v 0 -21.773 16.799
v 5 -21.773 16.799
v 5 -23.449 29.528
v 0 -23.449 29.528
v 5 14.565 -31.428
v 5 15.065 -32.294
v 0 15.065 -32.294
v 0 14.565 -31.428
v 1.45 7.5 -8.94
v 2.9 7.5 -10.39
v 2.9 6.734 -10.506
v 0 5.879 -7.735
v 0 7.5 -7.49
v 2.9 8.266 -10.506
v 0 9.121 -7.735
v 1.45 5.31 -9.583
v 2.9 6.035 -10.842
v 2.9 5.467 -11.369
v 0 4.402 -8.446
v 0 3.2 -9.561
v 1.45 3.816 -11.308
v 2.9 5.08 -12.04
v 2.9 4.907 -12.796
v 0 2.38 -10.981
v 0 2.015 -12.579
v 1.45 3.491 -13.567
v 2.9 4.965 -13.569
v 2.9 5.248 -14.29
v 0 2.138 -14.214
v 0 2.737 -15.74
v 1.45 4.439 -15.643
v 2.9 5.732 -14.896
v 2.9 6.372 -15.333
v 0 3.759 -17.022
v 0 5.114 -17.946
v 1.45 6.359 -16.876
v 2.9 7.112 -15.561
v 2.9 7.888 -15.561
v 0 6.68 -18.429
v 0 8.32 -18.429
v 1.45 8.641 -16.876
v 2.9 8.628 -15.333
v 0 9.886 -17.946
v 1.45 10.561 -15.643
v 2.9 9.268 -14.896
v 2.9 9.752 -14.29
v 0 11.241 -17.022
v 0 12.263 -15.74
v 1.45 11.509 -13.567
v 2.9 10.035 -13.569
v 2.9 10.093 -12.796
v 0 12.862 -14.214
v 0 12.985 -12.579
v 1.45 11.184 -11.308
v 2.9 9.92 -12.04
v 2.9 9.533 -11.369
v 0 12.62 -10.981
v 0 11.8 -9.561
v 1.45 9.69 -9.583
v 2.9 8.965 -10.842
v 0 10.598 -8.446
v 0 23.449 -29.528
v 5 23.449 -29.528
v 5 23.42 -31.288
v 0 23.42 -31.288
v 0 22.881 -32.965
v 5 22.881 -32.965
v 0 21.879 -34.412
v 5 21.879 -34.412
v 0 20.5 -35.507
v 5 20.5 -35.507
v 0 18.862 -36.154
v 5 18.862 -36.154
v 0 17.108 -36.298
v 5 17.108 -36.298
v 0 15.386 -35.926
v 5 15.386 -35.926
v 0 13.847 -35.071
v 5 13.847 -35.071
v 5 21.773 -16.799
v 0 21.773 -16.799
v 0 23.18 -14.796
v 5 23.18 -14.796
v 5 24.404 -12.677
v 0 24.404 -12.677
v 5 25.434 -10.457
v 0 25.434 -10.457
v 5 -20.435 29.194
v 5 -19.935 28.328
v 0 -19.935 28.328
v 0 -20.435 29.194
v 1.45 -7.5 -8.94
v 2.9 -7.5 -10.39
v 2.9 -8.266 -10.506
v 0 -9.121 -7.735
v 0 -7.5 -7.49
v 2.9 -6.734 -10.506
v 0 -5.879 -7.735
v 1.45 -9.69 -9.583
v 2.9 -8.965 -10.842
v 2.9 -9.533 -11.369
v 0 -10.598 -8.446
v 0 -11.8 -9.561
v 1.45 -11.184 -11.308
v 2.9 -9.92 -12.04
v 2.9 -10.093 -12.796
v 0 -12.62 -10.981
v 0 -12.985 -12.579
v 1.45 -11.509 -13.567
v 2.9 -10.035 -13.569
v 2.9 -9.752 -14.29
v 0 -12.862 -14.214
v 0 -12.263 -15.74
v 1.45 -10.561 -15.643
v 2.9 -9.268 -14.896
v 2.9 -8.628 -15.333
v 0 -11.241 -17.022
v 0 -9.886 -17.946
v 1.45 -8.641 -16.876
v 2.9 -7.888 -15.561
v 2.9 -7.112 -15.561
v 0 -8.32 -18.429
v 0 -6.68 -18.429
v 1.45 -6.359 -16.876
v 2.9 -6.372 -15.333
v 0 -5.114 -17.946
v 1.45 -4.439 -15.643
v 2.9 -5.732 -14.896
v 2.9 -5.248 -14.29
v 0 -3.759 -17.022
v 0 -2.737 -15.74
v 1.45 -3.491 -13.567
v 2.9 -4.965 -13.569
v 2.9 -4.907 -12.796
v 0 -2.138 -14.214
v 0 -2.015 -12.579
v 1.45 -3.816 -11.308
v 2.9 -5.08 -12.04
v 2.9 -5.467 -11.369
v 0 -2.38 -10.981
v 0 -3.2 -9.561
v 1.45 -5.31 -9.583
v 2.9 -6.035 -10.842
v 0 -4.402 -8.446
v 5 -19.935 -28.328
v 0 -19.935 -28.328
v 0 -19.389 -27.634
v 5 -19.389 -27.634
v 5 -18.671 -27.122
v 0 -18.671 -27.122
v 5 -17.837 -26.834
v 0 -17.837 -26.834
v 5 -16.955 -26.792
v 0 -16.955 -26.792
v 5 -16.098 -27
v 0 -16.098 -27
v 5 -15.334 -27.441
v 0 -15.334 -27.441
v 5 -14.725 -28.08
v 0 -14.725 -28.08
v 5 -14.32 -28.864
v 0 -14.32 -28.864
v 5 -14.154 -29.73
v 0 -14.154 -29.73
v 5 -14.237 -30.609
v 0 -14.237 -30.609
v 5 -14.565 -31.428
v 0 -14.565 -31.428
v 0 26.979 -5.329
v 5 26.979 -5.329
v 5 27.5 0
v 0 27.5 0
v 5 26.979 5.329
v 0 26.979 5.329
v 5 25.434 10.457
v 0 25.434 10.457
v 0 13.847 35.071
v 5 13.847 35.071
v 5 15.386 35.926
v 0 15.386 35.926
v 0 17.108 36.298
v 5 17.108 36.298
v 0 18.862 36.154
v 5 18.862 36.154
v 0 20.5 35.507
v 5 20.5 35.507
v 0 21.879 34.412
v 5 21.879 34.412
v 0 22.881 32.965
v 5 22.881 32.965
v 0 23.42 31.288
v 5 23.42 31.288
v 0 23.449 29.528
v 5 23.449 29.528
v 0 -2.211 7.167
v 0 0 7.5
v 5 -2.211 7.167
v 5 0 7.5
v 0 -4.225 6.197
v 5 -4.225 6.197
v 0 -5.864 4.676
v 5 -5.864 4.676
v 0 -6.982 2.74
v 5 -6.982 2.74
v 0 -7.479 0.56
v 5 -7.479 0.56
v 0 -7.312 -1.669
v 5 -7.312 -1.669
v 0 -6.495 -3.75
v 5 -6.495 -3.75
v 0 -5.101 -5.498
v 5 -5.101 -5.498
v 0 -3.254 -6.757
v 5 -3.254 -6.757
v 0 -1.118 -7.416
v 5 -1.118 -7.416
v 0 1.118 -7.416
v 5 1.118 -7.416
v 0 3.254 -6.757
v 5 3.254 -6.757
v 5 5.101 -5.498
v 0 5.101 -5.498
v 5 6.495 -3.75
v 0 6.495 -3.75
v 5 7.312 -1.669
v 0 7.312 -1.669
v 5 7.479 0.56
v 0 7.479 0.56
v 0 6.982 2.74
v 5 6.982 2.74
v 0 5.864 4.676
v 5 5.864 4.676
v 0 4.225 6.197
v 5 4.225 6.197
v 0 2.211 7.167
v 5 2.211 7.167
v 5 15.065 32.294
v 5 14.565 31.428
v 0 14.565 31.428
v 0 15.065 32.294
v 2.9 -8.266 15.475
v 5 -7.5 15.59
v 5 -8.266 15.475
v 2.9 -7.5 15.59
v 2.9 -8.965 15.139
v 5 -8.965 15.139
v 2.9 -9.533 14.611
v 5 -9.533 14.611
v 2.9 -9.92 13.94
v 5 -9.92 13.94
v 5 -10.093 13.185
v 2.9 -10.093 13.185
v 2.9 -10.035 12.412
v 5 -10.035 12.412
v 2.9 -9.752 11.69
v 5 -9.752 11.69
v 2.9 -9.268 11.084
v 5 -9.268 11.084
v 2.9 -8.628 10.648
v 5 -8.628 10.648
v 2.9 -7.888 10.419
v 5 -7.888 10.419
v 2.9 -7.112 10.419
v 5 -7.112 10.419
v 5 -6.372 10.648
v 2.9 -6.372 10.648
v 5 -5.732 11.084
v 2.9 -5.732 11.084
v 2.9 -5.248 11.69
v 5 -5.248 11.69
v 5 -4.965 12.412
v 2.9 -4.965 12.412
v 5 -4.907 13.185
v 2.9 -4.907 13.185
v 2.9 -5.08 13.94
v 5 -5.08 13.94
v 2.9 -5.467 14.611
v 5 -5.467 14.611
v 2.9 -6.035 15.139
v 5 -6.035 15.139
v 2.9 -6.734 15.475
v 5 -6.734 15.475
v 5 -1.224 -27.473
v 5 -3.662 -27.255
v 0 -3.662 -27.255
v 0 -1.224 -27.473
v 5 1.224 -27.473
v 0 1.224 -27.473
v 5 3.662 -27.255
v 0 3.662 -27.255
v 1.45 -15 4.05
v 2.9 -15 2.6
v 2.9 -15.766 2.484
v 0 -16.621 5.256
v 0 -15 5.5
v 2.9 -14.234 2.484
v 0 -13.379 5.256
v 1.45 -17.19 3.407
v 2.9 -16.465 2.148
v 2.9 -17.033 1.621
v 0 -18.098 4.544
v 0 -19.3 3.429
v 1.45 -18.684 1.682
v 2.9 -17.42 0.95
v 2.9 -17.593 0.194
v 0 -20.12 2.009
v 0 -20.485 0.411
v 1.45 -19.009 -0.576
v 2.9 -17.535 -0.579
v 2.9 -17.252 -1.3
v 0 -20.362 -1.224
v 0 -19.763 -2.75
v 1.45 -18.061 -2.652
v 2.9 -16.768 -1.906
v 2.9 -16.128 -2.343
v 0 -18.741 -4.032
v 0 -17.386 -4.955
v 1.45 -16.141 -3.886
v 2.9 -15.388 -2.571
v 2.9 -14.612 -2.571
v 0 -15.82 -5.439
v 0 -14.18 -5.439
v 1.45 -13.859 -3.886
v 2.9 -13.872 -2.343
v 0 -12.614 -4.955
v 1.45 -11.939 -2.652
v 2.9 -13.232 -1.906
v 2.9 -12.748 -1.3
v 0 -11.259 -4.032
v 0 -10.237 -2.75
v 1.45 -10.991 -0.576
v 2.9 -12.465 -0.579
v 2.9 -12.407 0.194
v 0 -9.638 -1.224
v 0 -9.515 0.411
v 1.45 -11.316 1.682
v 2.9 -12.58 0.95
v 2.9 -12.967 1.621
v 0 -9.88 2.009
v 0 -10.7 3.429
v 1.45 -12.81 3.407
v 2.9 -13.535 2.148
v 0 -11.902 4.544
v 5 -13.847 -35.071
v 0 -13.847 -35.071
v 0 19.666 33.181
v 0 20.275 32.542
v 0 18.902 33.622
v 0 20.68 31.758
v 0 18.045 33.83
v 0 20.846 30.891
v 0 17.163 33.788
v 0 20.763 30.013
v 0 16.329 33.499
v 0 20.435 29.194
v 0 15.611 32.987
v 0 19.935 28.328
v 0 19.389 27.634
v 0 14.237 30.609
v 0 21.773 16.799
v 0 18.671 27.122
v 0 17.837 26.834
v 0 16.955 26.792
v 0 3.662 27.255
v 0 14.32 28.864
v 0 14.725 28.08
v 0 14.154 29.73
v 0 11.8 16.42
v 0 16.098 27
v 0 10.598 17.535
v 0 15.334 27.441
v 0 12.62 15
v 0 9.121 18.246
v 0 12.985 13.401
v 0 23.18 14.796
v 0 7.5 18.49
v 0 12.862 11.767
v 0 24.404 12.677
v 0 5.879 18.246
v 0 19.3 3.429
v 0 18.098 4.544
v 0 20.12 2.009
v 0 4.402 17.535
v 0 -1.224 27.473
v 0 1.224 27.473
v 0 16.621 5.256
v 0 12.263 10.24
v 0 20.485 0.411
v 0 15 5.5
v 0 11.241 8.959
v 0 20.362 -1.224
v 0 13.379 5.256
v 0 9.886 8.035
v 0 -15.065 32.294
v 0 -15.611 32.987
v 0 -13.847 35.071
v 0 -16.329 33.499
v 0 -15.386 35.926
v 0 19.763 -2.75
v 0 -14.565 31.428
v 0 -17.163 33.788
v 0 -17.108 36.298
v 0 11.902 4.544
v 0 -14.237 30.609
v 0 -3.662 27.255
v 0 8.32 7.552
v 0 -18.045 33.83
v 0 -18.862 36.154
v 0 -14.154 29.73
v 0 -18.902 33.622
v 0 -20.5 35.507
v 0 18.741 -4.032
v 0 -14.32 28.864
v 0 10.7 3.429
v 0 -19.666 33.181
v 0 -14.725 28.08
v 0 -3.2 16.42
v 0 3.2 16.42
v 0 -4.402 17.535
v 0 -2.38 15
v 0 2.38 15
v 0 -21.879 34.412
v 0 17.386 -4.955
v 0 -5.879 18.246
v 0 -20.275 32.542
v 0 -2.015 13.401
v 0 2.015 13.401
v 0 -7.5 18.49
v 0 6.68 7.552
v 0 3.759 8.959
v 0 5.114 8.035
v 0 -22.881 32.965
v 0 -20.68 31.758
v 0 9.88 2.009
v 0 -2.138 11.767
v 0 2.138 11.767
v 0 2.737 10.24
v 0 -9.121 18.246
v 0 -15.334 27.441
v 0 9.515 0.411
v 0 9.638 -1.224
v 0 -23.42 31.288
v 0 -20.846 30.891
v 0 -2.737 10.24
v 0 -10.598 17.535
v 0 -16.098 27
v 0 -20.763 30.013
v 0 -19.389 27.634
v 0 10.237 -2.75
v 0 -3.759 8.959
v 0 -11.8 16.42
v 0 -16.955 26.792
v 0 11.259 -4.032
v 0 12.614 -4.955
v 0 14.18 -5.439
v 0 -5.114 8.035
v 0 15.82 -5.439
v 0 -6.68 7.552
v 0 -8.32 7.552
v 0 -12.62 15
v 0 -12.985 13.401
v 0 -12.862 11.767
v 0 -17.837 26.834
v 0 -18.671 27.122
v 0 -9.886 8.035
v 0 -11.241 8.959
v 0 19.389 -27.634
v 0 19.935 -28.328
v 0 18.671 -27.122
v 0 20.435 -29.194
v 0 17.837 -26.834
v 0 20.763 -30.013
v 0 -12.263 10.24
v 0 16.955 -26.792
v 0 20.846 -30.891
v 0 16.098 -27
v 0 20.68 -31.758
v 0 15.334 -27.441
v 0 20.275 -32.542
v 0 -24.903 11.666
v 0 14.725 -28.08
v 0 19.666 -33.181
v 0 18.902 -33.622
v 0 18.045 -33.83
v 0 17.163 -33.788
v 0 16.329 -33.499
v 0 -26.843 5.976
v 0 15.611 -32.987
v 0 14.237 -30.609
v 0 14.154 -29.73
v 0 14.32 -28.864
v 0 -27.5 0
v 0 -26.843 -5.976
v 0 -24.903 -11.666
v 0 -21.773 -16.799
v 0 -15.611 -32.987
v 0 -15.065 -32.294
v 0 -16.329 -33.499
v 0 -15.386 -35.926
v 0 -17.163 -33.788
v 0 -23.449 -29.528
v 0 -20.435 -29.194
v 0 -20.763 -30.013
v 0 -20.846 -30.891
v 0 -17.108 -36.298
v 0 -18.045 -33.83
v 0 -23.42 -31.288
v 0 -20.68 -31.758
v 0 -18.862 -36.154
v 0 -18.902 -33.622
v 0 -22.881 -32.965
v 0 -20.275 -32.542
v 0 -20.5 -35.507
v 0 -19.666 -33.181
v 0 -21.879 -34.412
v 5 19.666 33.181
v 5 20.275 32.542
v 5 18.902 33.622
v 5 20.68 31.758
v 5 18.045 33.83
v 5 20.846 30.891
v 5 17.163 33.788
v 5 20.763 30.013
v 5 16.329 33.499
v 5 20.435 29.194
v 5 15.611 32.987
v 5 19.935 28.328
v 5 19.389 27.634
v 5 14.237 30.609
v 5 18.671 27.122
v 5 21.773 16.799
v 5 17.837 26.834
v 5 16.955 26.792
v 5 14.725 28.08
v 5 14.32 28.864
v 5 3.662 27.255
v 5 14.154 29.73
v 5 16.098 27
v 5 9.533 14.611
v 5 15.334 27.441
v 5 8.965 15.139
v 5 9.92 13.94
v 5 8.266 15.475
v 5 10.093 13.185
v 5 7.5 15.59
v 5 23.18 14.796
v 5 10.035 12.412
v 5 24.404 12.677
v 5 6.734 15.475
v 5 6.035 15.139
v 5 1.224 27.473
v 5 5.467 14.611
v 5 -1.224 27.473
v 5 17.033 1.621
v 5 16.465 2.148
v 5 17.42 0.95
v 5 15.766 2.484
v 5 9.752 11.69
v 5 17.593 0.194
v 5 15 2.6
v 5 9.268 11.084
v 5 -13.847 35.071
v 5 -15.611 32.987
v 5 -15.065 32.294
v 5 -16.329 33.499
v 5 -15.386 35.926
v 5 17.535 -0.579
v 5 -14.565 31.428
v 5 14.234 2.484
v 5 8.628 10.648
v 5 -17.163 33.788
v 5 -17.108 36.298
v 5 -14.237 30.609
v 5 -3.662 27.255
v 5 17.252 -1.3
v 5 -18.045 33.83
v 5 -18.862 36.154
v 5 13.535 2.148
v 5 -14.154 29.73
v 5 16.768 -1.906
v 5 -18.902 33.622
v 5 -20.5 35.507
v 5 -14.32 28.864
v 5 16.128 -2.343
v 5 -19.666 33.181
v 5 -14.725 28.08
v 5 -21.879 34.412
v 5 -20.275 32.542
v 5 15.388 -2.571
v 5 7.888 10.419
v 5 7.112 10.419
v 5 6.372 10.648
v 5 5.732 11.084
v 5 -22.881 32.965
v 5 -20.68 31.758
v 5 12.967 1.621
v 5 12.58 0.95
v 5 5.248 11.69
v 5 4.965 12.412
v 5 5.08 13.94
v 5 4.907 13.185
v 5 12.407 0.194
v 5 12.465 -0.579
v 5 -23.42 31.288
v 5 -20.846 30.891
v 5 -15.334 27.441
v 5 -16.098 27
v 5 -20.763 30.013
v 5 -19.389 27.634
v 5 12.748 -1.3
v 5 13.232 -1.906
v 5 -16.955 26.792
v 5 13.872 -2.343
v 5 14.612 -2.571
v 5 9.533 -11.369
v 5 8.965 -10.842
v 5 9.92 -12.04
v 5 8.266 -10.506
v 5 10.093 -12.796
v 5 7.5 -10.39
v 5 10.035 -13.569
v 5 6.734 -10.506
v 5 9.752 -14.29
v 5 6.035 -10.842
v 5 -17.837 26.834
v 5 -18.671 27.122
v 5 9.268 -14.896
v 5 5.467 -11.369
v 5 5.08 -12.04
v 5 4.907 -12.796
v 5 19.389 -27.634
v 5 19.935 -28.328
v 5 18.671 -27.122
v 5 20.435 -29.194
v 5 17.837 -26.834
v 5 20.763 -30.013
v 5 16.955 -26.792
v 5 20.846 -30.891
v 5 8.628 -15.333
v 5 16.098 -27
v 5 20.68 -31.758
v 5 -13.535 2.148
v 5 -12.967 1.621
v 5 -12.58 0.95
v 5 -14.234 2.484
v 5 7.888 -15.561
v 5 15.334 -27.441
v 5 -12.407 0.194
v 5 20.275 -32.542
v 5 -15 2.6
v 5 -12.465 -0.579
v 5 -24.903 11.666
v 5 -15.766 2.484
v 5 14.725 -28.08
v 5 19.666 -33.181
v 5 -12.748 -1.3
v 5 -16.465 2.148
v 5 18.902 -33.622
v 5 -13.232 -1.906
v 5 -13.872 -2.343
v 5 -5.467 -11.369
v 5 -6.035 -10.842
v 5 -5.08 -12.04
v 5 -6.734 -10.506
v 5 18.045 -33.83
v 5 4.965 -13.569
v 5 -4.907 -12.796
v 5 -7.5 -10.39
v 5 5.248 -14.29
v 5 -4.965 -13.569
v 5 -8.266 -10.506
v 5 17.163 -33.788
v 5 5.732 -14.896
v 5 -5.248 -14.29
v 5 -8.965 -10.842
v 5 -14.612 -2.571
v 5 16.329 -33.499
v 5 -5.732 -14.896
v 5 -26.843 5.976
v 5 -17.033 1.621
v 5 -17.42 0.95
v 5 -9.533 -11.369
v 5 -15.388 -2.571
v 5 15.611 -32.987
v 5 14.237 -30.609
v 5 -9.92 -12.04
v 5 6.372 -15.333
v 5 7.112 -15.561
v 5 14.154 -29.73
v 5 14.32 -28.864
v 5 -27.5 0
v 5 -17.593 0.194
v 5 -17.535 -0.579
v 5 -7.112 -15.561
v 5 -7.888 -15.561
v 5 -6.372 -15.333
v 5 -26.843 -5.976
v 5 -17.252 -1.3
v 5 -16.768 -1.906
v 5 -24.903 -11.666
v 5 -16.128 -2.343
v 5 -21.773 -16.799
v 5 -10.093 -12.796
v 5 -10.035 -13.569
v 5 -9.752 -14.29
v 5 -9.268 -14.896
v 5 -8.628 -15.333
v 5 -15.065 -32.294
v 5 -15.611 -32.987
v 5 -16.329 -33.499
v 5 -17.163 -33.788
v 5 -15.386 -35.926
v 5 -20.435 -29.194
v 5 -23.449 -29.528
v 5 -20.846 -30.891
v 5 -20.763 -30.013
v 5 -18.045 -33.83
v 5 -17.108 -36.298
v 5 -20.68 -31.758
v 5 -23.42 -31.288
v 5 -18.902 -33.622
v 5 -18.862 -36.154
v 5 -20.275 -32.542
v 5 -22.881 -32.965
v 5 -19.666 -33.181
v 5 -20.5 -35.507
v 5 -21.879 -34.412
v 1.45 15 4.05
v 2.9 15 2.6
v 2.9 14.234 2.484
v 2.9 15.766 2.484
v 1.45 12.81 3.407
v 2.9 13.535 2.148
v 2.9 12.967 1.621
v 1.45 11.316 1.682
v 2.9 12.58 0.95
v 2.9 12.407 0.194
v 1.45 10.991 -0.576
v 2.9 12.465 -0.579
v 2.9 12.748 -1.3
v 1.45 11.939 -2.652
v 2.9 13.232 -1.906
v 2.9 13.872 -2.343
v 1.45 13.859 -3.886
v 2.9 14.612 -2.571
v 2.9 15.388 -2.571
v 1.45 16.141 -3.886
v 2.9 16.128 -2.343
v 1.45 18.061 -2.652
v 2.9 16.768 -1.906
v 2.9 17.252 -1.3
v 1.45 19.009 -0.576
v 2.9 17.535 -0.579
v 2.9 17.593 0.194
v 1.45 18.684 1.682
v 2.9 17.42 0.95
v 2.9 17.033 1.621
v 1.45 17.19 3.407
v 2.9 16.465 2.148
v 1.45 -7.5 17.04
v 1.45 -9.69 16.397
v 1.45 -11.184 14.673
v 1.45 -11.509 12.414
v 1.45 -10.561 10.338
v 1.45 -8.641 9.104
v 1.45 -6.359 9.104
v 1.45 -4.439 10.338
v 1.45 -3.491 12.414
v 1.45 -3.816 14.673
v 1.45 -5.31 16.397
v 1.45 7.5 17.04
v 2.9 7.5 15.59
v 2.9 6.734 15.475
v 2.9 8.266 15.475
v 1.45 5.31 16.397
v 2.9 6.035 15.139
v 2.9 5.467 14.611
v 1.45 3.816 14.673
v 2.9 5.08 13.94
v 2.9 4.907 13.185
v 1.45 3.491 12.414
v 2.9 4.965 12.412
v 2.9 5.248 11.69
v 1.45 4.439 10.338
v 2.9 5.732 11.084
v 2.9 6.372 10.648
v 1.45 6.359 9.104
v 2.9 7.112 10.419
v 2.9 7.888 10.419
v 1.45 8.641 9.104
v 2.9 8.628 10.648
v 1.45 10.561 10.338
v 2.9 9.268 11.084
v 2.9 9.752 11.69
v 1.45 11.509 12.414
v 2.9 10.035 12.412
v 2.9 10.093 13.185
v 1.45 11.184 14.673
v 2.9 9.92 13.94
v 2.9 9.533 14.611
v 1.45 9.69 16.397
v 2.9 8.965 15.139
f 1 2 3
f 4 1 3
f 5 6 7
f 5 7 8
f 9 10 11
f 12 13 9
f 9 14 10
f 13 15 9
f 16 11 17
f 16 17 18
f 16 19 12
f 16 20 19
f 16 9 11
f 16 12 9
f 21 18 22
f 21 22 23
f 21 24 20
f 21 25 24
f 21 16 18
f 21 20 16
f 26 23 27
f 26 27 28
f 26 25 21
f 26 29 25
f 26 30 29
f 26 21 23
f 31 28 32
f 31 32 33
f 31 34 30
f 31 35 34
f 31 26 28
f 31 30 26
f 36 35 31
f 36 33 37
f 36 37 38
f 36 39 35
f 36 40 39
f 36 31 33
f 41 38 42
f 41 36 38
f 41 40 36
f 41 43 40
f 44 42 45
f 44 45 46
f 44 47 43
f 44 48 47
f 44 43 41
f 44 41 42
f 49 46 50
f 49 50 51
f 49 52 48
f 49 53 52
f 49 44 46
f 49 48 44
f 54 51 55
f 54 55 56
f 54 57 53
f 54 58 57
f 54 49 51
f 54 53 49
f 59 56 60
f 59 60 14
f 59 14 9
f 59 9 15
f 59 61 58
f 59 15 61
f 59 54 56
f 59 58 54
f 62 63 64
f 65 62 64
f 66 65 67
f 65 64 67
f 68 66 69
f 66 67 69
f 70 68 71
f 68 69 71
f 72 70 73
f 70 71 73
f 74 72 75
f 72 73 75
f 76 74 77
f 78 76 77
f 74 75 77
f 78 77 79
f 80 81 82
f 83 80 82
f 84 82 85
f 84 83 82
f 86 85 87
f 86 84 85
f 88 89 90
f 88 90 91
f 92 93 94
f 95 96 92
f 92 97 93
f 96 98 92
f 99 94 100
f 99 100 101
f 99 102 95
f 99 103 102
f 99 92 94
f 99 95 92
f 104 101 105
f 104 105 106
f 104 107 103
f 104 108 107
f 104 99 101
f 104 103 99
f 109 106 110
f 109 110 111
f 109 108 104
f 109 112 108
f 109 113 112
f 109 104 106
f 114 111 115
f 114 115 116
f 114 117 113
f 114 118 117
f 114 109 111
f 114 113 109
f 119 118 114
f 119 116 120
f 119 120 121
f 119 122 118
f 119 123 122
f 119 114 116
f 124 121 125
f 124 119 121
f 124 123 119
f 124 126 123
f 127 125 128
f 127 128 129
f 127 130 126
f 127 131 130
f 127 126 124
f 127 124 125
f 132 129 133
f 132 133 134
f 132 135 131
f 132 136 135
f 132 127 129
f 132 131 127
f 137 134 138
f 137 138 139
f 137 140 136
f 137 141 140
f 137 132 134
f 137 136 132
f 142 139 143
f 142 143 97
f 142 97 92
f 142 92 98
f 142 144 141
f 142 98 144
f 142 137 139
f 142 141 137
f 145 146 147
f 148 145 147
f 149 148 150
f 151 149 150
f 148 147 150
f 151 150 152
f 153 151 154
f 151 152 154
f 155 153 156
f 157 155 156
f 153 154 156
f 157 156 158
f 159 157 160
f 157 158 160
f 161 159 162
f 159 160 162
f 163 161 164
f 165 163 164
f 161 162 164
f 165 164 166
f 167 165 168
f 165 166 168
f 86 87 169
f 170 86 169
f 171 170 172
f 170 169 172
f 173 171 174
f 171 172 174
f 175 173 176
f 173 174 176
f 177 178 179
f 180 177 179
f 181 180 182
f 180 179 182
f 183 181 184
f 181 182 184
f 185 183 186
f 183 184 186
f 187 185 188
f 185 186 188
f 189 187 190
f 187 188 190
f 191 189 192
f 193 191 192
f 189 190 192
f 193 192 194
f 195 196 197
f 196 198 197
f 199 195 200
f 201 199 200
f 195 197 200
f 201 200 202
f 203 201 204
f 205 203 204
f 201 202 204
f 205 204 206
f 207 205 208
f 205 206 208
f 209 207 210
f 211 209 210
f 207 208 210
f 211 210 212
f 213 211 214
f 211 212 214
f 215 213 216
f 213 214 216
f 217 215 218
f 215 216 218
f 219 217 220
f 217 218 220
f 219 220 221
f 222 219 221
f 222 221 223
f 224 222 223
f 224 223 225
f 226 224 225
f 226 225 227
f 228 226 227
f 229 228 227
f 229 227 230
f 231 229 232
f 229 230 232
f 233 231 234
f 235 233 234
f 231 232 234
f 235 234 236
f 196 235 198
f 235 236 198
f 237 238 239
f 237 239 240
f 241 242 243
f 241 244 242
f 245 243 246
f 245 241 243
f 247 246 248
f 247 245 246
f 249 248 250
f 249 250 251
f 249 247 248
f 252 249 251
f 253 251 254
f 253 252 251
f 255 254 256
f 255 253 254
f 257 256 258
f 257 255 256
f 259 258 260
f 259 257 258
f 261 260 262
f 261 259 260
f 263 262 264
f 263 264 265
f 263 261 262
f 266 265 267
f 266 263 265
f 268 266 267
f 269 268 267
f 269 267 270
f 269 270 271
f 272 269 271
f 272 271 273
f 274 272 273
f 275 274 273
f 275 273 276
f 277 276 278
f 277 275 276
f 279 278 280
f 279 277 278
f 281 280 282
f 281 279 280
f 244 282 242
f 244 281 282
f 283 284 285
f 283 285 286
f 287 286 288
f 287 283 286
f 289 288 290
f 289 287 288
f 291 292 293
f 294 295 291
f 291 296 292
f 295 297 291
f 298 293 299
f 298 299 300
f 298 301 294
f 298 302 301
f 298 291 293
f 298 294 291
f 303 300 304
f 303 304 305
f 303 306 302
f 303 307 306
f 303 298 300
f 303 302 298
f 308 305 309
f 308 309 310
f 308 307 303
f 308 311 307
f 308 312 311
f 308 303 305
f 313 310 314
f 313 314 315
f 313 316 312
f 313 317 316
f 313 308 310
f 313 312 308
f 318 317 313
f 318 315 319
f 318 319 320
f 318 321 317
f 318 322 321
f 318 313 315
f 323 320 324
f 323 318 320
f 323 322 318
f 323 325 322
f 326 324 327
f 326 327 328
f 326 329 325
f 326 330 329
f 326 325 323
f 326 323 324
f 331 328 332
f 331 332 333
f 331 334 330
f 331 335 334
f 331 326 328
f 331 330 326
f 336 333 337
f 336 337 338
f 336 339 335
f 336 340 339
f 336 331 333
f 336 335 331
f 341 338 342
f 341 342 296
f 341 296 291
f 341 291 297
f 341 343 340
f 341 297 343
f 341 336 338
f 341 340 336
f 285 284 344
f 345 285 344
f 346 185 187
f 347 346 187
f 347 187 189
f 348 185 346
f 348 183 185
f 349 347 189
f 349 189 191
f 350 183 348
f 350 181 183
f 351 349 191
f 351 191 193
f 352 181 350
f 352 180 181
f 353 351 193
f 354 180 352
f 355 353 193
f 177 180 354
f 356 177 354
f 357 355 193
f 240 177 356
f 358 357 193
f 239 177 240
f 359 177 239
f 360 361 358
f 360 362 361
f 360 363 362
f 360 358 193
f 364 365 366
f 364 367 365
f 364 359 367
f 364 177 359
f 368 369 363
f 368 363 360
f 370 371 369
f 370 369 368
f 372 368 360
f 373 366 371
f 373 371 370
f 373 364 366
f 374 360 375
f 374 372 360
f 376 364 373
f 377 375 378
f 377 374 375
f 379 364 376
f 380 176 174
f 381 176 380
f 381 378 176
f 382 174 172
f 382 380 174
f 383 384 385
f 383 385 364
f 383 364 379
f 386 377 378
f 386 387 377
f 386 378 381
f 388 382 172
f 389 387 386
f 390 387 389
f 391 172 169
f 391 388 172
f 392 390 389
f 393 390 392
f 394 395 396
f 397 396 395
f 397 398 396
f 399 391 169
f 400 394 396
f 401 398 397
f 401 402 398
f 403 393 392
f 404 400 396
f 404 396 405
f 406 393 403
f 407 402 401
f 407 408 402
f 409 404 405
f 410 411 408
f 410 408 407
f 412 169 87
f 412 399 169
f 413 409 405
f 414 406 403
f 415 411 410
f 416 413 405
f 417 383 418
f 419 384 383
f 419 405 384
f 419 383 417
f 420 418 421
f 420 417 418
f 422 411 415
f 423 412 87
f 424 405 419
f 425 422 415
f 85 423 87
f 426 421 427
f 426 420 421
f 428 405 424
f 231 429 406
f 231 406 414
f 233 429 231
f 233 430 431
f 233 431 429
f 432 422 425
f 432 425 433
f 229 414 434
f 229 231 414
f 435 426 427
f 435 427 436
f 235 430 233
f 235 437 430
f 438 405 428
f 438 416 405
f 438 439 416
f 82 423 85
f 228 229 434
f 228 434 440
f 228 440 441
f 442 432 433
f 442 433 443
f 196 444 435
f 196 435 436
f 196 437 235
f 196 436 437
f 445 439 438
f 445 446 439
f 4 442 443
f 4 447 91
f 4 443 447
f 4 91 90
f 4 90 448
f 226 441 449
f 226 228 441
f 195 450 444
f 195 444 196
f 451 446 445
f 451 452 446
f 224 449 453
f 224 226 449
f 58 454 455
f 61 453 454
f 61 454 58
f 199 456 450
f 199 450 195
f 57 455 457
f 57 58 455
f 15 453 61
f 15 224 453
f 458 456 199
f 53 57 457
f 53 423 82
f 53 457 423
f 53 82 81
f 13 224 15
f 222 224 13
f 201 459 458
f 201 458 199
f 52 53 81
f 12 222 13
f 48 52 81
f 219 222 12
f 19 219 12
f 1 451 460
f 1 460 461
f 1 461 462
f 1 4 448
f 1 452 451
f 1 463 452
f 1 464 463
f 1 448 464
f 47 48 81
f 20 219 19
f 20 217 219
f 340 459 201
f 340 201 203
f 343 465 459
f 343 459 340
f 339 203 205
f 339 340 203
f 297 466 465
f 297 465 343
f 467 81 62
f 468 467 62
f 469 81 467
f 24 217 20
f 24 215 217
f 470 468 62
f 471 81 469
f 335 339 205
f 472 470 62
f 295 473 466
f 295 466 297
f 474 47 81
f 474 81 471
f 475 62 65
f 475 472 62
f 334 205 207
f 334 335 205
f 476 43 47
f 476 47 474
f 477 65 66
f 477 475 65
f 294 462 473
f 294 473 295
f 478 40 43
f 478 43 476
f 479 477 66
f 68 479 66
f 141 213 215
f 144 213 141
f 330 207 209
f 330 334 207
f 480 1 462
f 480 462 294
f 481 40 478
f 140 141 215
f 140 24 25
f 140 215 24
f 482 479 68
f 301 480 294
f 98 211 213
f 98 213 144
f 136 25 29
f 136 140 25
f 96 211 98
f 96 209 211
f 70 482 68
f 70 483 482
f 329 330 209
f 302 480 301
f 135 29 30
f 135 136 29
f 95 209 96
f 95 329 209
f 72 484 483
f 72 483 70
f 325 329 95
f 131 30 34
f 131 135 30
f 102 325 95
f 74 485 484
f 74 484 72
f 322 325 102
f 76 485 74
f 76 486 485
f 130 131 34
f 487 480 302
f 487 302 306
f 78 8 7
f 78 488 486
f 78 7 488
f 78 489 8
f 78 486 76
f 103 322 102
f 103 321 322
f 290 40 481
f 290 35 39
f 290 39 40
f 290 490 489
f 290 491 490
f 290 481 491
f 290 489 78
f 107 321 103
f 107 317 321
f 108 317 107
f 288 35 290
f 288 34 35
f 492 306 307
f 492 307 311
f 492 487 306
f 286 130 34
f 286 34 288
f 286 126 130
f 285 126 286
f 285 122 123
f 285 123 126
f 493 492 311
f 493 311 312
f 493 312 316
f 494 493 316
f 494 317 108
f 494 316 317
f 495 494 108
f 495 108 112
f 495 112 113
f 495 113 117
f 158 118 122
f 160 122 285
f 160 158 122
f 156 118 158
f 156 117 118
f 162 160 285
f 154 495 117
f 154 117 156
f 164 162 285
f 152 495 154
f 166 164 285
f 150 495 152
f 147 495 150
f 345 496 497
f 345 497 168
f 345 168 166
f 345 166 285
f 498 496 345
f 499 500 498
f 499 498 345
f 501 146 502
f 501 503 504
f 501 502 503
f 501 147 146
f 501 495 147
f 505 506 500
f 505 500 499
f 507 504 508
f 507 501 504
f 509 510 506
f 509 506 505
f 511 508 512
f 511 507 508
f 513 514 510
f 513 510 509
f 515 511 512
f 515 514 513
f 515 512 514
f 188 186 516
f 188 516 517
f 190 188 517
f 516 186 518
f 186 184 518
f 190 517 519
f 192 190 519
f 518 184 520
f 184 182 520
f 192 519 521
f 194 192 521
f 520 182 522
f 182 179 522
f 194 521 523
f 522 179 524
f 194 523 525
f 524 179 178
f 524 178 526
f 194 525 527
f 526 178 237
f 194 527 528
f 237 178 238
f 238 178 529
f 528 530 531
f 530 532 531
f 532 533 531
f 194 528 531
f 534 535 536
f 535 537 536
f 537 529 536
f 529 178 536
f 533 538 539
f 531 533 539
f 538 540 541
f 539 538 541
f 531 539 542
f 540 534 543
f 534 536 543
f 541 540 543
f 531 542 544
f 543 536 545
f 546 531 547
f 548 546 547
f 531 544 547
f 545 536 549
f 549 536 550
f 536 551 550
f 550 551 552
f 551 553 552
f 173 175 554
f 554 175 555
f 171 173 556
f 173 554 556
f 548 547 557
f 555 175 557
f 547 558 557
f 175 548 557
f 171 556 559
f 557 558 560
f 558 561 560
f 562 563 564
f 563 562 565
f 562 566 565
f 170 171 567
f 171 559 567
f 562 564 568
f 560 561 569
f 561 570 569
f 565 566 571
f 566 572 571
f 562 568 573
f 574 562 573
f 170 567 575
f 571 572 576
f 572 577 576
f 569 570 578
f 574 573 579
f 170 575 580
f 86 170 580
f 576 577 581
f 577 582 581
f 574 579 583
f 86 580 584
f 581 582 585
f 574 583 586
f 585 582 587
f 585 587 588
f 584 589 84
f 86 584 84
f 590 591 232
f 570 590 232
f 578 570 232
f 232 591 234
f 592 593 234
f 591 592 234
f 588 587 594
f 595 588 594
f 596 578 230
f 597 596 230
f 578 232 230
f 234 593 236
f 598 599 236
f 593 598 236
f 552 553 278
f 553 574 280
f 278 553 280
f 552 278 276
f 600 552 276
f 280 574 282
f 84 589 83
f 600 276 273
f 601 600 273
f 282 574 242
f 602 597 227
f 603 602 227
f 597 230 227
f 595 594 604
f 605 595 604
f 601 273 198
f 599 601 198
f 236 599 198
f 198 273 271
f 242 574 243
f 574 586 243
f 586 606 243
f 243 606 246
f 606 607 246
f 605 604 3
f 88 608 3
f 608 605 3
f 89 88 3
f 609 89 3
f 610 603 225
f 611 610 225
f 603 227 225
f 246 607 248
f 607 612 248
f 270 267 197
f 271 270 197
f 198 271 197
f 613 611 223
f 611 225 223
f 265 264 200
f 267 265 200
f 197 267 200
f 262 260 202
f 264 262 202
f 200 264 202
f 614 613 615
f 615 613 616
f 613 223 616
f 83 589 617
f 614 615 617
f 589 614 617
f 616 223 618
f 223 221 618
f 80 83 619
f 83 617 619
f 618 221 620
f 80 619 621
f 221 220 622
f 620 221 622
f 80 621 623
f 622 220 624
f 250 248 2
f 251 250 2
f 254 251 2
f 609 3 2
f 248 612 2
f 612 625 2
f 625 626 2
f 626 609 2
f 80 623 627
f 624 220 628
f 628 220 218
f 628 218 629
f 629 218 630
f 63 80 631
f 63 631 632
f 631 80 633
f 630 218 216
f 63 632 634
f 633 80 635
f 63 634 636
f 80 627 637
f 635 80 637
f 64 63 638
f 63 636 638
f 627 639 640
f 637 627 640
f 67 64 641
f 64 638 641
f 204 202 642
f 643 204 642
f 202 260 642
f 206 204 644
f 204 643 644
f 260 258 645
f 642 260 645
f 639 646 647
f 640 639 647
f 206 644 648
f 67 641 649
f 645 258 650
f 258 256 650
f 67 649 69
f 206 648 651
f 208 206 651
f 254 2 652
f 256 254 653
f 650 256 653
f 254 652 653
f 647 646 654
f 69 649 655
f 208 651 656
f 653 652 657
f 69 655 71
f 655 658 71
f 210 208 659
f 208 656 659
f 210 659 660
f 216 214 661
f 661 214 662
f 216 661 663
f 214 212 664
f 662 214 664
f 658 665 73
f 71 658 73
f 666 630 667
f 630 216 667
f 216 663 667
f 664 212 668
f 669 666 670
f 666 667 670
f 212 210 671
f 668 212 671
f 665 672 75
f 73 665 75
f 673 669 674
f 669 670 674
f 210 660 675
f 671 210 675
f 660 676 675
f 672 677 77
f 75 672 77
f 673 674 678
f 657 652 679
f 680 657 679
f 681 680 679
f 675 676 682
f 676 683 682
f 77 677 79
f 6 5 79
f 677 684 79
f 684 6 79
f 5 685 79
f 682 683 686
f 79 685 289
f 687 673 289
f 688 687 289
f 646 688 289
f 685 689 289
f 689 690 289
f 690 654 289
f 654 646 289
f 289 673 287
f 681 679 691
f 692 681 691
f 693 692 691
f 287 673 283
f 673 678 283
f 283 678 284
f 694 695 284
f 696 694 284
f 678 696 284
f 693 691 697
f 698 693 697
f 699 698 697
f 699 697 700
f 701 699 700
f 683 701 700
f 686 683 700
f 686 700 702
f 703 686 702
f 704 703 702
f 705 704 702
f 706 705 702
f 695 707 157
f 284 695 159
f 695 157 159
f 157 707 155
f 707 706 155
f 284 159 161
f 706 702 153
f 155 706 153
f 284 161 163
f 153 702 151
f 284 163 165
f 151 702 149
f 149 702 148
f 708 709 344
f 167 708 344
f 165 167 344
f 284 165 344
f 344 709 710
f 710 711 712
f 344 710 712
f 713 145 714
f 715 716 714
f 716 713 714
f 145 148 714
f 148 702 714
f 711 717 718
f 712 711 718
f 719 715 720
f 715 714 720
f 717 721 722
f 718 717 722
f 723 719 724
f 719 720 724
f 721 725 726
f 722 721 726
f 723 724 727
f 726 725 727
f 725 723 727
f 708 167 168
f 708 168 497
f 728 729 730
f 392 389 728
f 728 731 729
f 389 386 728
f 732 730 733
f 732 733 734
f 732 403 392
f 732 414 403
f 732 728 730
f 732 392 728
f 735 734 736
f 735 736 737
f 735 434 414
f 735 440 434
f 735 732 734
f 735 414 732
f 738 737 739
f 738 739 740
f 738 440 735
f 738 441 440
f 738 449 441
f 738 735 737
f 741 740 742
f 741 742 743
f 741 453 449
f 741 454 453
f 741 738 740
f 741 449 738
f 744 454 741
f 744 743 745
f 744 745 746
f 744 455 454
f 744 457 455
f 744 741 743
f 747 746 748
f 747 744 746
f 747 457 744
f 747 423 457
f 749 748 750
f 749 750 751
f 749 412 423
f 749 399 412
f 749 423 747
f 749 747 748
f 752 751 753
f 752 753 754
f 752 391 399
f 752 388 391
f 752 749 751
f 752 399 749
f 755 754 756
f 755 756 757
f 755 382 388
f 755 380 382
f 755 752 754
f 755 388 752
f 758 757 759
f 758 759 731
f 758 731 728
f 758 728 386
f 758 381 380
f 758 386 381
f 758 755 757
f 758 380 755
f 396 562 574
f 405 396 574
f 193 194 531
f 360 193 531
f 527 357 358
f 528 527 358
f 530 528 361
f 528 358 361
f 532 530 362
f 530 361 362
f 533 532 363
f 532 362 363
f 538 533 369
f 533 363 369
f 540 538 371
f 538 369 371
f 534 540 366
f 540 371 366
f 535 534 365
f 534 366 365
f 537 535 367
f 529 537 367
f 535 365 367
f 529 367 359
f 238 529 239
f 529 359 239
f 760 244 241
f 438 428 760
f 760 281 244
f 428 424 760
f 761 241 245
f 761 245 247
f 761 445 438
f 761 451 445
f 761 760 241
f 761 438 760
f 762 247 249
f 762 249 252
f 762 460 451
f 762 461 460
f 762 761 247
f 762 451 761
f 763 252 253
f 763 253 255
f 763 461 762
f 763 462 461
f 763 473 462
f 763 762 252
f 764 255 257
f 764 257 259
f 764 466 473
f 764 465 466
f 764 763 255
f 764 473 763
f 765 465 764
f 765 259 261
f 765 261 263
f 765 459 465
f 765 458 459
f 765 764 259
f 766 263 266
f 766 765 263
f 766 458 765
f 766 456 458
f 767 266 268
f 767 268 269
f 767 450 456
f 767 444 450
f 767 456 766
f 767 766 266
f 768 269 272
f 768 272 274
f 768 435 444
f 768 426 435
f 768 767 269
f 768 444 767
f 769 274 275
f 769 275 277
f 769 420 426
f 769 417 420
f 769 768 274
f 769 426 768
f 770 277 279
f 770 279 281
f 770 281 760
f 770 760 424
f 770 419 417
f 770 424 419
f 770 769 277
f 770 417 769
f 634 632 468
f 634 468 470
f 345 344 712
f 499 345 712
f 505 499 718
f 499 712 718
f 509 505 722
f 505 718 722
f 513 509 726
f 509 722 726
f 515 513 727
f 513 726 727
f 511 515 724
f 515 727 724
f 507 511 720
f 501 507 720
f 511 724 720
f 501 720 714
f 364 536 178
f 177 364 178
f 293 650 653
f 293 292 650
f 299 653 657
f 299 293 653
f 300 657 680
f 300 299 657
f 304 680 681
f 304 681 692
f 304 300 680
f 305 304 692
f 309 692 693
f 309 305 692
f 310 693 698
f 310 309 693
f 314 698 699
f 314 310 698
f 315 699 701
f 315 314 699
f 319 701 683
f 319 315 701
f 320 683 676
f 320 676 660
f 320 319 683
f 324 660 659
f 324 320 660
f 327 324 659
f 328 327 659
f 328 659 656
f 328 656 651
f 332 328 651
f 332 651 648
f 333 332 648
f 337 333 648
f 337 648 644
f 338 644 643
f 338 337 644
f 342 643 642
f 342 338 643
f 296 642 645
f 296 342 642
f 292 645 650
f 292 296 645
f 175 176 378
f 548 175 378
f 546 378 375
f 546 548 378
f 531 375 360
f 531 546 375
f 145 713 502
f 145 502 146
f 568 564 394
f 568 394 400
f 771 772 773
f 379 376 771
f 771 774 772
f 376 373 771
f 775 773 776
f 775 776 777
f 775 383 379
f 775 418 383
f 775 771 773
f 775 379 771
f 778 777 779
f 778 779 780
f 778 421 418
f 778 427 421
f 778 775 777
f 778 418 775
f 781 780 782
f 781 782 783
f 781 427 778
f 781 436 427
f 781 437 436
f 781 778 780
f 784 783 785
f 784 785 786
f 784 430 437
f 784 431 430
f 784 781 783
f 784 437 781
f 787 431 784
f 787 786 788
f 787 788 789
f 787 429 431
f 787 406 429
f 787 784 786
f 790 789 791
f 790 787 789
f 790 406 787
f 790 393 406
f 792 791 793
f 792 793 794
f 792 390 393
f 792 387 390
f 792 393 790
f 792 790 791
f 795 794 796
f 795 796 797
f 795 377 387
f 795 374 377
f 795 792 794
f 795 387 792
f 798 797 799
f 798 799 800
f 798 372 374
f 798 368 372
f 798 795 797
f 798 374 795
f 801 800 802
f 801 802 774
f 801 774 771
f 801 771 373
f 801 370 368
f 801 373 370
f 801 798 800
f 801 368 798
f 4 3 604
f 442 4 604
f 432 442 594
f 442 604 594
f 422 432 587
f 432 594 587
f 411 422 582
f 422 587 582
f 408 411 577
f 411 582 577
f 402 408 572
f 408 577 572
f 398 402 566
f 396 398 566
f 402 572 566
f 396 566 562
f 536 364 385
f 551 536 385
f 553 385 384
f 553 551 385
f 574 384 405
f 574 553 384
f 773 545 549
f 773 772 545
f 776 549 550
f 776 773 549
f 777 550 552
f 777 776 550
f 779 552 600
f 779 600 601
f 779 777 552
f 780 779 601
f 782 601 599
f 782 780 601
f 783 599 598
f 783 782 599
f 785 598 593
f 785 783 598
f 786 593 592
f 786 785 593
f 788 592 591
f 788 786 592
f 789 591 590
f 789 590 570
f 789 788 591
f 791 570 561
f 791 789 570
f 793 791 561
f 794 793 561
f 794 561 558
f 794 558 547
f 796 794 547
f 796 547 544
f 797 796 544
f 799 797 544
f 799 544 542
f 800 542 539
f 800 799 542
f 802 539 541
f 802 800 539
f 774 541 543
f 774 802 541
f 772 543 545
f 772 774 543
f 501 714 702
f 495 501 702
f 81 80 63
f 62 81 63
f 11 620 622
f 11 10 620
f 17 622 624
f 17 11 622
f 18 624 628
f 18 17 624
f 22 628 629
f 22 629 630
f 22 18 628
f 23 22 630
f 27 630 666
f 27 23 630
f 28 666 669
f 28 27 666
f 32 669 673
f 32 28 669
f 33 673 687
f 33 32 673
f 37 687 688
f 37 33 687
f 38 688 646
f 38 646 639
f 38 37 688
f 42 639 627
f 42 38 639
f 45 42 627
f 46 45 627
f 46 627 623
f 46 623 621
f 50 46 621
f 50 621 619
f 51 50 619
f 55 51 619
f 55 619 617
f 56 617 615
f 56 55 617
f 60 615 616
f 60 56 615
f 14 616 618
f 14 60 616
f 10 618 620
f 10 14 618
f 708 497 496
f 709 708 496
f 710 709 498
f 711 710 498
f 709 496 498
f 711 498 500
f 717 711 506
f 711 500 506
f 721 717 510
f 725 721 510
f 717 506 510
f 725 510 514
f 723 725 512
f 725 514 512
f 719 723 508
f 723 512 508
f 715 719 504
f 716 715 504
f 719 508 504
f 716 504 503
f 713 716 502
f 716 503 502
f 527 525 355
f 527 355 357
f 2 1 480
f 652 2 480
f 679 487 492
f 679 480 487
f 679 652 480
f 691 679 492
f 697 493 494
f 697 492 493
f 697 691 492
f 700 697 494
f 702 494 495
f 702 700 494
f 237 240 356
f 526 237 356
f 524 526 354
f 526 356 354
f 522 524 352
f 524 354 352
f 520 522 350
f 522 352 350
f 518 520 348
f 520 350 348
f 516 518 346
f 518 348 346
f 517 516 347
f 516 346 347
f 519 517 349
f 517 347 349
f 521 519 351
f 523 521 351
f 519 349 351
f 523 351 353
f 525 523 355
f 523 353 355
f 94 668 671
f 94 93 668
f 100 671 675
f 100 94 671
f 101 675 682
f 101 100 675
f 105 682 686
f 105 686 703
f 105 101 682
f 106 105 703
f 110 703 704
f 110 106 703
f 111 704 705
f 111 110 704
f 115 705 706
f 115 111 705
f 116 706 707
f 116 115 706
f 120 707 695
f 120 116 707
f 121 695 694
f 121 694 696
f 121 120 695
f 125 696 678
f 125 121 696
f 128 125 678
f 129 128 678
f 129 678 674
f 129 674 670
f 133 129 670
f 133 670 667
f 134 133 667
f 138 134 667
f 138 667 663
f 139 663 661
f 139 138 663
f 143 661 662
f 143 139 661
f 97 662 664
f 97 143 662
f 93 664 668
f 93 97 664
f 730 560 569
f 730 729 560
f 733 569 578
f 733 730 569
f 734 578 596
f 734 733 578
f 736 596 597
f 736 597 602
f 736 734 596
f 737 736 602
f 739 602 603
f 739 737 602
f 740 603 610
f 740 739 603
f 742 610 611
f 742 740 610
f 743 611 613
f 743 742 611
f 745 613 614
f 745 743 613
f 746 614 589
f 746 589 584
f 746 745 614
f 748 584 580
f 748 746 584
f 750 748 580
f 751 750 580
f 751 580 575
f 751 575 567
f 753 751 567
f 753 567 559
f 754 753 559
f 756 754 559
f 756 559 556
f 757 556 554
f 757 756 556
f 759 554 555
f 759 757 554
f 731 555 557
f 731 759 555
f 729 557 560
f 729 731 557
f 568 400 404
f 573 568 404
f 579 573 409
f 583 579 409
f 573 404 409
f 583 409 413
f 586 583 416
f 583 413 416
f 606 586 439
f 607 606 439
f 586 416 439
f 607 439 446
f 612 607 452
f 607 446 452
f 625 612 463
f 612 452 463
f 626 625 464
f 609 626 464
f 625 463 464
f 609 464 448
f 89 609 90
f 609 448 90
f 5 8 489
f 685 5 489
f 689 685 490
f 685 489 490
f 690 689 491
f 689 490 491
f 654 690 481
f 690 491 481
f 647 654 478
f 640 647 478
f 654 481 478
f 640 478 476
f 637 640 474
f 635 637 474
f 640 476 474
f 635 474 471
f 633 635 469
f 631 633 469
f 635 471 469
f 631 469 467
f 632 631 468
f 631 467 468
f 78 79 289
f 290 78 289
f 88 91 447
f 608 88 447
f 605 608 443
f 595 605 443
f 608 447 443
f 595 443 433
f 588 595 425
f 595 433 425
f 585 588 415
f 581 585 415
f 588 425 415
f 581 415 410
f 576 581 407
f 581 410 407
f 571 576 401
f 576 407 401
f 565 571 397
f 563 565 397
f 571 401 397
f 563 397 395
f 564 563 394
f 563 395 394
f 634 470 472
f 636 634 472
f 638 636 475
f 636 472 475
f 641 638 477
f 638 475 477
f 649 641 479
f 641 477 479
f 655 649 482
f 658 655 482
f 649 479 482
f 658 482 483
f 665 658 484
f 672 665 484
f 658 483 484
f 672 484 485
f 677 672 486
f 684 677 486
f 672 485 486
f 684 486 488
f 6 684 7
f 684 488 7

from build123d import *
from build123d.topology import SkipClean

# Parameters (mm, degrees)
SKETCH_1_W                 = 5
SKETCH_1_H                 = 20
EXTRUDE_START              = -5
EXTRUDE_1_DEPTH            = 5
PATTERN_CIRCULAR_3_COUNT   = 3
PATTERN_CIRCULAR_3_ANGLE   = 120
F_3_THE_OTHER_WAY_COUNT    = 3
F_3_THE_OTHER_WAY_ANGLE    = 120
CUT_EXTRUDE_3_DEPTH        = 55.995278612
PATTERN_CIRCULAR_2_COUNT   = 3
PATTERN_CIRCULAR_2_ANGLE   = 120
F_2_THE_OTHER_WAY_COUNT    = 3
F_2_THE_OTHER_WAY_ANGLE    = 120
HOLE_WIZARD_M51_AT_2_COUNT = 2
HOLE_WIZARD_M51_AT_2_PITCH = 15
HOLE_WIZARD_M51_AT_3_COUNT = 2
HOLE_WIZARD_M51_AT_3_PITCH = 25.980762114
HOLE_WIZARD_M51_AT_4_COUNT = 2
HOLE_WIZARD_M51_AT_4_PITCH = 30
HOLE_WIZARD_M51_AT_5_COUNT = 2
HOLE_WIZARD_M51_AT_5_PITCH = 25.980762114
HOLE_WIZARD_M51_AT_6_COUNT = 2
HOLE_WIZARD_M51_AT_6_PITCH = 15
CUT_EXTRUDE_4_DEPTH        = 55.995278612


with BuildPart() as part:
    # Эскиз1 → Повернуть1 (revolve)
    with BuildSketch(Plane.XY, mode=Mode.PRIVATE) as revolve_1_sk:
        with Locations((2.5, 17.5)):
            Rectangle(SKETCH_1_W, SKETCH_1_H)
    revolve(revolve_1_sk.sketch.rotate(Axis((-29.36512031, 0, 0), (1, 0, 0)), 90), axis=Axis((-29.36512031, 0, 0), (1, 0, 0)))

    # Эскиз11 → Бобышка-Вытянуть1 (add)
    with BuildSketch(Plane.ZY.offset(EXTRUDE_START)):
        with BuildLine():
            Line((-5.543277195, 37.296100594), (-10.456537126, 25.434441832))
            ThreePointArc((-10.456537126, 25.434441832), (0, 27.5), (10.456537126, 25.434441832))
            Line((10.456537126, 25.434441832), (5.543277195, 37.296100594))
            ThreePointArc((5.543277195, 37.296100594), (0, 41), (-5.543277195, 37.296100594))
        make_face()
    extrude_1 = extrude(amount=EXTRUDE_1_DEPTH)

    # Круговой массив3: Бобышка-Вытянуть1 ×3 about axis
    pattern_circular_3_axis = Axis((0, 0, 0), (-1, 0, 0))
    for i in range(1, PATTERN_CIRCULAR_3_COUNT):
        add(extrude_1.rotate(pattern_circular_3_axis, i * PATTERN_CIRCULAR_3_ANGLE / (PATTERN_CIRCULAR_3_COUNT - 1)))

    # 3 the other way: Бобышка-Вытянуть1 ×3 about axis
    f_3_the_other_way_axis = Axis((0, 0, 0), (1, 0, 0))
    for i in range(1, F_3_THE_OTHER_WAY_COUNT):
        add(extrude_1.rotate(f_3_the_other_way_axis, i * F_3_THE_OTHER_WAY_ANGLE / (F_3_THE_OTHER_WAY_COUNT - 1)))

    # Эскиз6 → Вырез-Вытянуть3 (cut, symmetric)
    with BuildSketch(Plane.ZY):
        with BuildLine():
            Line((-3.1, 35.5), (-3.1, 34.5))
            ThreePointArc((-3.1, 34.5), (0, 31.4), (3.1, 34.5))
            Line((3.1, 34.5), (3.1, 35.5))
            ThreePointArc((3.1, 35.5), (0, 38.6), (-3.1, 35.5))
        make_face()
    cut_extrude_3 = extrude(amount=CUT_EXTRUDE_3_DEPTH, both=True, mode=Mode.SUBTRACT)

    # Круговой массив2: Вырез-Вытянуть3 ×3 about axis
    pattern_circular_2_axis = Axis((0, 0, 0), (-1, 0, 0))
    for i in range(1, PATTERN_CIRCULAR_2_COUNT):
        add(cut_extrude_3.rotate(pattern_circular_2_axis, i * PATTERN_CIRCULAR_2_ANGLE / (PATTERN_CIRCULAR_2_COUNT - 1)), mode=Mode.SUBTRACT)

    # 2 the other way: Вырез-Вытянуть3 ×3 about axis
    f_2_the_other_way_axis = Axis((0, 0, 0), (1, 0, 0))
    for i in range(1, F_2_THE_OTHER_WAY_COUNT):
        add(cut_extrude_3.rotate(f_2_the_other_way_axis, i * F_2_THE_OTHER_WAY_ANGLE / (F_2_THE_OTHER_WAY_COUNT - 1)), mode=Mode.SUBTRACT)

    # Эскиз10 → Зенковка для винта с потайной головкой и внутренним шестигранником M51 (revolve, cut)
    with BuildSketch(Plane.ZX.offset(15)):
        Polygon((0, 0), (0, 5), (2.6, 5), (2.6, 2.9), (5.5, 0), align=None)
    hole_wizard_m51 = revolve(axis=Axis((-6.35, 15, 0), (1, 0, 0)), mode=Mode.SUBTRACT)

    # Зенковка для винта с потайной головкой и внутренним шестигранником M51 at 2: Зенковка для винта с потайной головкой и внутренним шестигранником M51 ×2
    with Locations(*[Vector(0, -0.4999999999999632, 0.8660254037844599) * (i * HOLE_WIZARD_M51_AT_2_PITCH) for i in range(1, HOLE_WIZARD_M51_AT_2_COUNT)]):
        add(hole_wizard_m51, mode=Mode.SUBTRACT)

    # Зенковка для винта с потайной головкой и внутренним шестигранником M51 at 3: Зенковка для винта с потайной головкой и внутренним шестигранником M51 ×2
    with Locations(*[Vector(0, -0.8660254037844174, 0.5000000000000369) * (i * HOLE_WIZARD_M51_AT_3_PITCH) for i in range(1, HOLE_WIZARD_M51_AT_3_COUNT)]):
        add(hole_wizard_m51, mode=Mode.SUBTRACT)

    # Зенковка для винта с потайной головкой и внутренним шестигранником M51 at 4: Зенковка для винта с потайной головкой и внутренним шестигранником M51 ×2
    with Locations(*[(0, -i * HOLE_WIZARD_M51_AT_4_PITCH, 0) for i in range(1, HOLE_WIZARD_M51_AT_4_COUNT)]):
        add(hole_wizard_m51, mode=Mode.SUBTRACT)

    # Зенковка для винта с потайной головкой и внутренним шестигранником M51 at 5: Зенковка для винта с потайной головкой и внутренним шестигранником M51 ×2
    with Locations(*[Vector(0, -0.8660254037844599, -0.49999999999996314) * (i * HOLE_WIZARD_M51_AT_5_PITCH) for i in range(1, HOLE_WIZARD_M51_AT_5_COUNT)]):
        add(hole_wizard_m51, mode=Mode.SUBTRACT)

    # Зенковка для винта с потайной головкой и внутренним шестигранником M51 at 6: Зенковка для винта с потайной головкой и внутренним шестигранником M51 ×2
    with Locations(*[Vector(0, -0.5000000000000366, -0.8660254037844176) * (i * HOLE_WIZARD_M51_AT_6_PITCH) for i in range(1, HOLE_WIZARD_M51_AT_6_COUNT)]):
        add(hole_wizard_m51, mode=Mode.SUBTRACT)

    # Эскиз12 → Вырез-Вытянуть4 (cut, through all)
    with SkipClean():  # the faces are left unmerged after this step: merging them gives an invalid solid
        with BuildSketch(Plane.ZY):
            with BuildLine():
                Line((10.456537126, 25.434441832), (5.543277195, 37.296100594))
                ThreePointArc((5.543277195, 37.296100594), (0, 41), (-5.543277195, 37.296100594))
                Line((-5.543277195, 37.296100594), (-10.456537126, 25.434441832))
                ThreePointArc((-10.456537126, 25.434441832), (0, 27.5), (10.456537126, 25.434441832))
            make_face()
        extrude(amount=-CUT_EXTRUDE_4_DEPTH, mode=Mode.SUBTRACT)


solid = part.part
